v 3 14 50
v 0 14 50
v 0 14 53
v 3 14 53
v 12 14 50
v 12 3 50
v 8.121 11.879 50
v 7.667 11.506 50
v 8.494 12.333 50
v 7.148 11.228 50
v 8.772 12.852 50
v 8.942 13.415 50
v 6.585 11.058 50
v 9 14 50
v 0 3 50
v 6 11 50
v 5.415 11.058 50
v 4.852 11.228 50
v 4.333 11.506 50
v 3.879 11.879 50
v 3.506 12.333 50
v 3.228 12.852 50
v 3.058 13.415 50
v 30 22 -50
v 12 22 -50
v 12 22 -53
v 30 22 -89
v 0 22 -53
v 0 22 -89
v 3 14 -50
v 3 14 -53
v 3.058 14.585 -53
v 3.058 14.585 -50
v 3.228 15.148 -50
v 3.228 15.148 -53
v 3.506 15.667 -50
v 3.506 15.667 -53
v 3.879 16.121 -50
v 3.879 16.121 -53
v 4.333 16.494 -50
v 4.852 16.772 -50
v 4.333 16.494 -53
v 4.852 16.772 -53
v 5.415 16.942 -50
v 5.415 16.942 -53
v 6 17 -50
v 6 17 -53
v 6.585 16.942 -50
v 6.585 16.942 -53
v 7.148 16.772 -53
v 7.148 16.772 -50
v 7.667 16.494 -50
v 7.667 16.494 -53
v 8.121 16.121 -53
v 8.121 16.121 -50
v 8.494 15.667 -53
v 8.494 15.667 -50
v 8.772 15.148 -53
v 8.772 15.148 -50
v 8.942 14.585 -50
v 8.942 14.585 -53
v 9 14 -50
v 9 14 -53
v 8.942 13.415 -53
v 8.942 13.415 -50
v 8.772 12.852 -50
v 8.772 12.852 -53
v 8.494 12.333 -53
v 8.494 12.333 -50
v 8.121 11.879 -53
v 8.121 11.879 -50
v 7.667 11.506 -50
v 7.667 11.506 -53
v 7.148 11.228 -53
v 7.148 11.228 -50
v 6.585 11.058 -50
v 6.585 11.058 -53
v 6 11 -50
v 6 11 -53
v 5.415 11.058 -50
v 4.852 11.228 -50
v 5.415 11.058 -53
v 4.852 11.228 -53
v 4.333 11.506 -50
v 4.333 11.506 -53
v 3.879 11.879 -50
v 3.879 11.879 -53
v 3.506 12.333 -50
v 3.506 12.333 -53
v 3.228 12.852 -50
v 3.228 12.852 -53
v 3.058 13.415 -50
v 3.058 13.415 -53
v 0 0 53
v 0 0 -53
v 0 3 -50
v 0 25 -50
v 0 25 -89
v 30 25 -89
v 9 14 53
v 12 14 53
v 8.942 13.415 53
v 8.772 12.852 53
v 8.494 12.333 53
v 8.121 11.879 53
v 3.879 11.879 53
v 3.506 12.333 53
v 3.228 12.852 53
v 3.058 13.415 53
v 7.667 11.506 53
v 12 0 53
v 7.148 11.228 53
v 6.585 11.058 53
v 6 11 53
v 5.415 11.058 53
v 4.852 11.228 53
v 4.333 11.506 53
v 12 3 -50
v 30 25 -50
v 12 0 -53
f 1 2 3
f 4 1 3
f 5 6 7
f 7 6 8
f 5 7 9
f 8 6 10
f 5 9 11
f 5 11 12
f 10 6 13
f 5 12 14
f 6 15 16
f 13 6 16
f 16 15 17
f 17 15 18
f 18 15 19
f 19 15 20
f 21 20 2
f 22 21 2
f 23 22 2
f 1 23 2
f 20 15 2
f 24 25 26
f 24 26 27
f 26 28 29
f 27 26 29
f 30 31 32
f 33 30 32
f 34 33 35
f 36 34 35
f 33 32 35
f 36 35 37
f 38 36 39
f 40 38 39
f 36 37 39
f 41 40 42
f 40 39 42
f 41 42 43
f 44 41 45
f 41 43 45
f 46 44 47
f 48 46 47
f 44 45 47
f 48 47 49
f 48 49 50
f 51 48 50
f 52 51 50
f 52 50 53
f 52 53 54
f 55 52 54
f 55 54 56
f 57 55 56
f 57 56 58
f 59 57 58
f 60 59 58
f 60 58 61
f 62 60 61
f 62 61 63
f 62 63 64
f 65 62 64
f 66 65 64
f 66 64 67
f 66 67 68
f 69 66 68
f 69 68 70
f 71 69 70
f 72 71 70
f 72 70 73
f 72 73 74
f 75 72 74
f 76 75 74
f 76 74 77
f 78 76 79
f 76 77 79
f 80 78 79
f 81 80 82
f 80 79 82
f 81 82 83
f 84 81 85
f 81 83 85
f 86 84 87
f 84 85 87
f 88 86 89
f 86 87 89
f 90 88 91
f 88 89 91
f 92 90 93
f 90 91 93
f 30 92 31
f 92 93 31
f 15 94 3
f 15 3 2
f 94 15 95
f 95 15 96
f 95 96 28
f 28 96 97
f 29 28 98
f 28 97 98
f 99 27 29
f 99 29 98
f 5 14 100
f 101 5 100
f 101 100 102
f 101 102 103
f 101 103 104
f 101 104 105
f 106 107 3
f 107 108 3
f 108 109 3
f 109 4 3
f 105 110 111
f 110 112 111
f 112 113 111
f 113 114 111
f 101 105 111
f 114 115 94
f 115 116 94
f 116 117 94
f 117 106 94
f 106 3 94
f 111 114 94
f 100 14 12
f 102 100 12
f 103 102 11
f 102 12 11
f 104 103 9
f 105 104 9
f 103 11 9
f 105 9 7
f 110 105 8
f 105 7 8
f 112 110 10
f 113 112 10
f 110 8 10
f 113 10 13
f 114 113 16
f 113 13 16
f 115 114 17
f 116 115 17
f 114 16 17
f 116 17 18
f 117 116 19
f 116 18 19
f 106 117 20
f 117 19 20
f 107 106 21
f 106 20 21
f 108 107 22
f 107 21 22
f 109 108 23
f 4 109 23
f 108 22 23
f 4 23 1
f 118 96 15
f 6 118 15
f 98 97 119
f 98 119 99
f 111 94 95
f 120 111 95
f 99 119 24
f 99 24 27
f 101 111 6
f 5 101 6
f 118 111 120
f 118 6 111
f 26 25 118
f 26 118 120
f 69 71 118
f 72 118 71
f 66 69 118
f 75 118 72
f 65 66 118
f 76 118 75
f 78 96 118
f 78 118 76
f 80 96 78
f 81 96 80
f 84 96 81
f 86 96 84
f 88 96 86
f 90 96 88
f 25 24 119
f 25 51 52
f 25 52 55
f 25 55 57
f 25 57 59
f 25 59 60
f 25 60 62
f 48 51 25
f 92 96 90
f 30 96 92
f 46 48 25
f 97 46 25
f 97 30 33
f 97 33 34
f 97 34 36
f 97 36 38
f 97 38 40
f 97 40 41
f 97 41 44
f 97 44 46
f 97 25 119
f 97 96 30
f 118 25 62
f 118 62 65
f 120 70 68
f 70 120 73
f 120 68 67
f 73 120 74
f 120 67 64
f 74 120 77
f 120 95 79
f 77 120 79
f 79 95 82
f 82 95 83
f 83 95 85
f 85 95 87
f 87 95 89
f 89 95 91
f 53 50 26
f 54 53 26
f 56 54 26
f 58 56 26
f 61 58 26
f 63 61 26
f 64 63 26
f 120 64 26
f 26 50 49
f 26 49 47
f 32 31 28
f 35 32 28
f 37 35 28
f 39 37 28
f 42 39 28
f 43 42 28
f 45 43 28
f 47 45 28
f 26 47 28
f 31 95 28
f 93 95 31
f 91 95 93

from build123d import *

# Parameters (mm, degrees)
EXTRUDE_1_DEPTH     = 12
CUT_EXTRUDE_1_REACH = 111.567
SKETCH_3_R          = 3
SKETCH_5_W          = 39
SKETCH_5_H          = 3
EXTRUDE_2_DEPTH     = 18


with BuildPart() as part:
    # 草图2 → 凸台-拉伸1 (new body)
    with BuildSketch(Plane(origin=(0, 0, 0), x_dir=(0, 0, -1), z_dir=(1, 0, 0))):
        Polygon((-53, 0), (53, 0), (53, 20), (53, 22), (89, 22), (89, 25), (50, 25), (50, 20), (50, 3), (-50, 3), (-50, 14), (-53, 14), align=None)
    extrude(amount=EXTRUDE_1_DEPTH)

    # 切除-拉伸1: up to this face of the body (flat: up to its plane)
    cut_extrude_1_end = Plane(part.part.faces().sort_by_distance((6, 7, 53))[0])
    # 草图3 → 切除-拉伸1 (cut, up to the picked face)
    with BuildSketch(Plane(origin=(0, 0, -53), x_dir=(-1, 0, 0), z_dir=(0, 0, -1)), mode=Mode.PRIVATE) as cut_extrude_1_sk1:
        with Locations((-6, 14)):
            Circle(SKETCH_3_R)
    cut_extrude_1_tool1 = split(extrude(cut_extrude_1_sk1.sketch, amount=-CUT_EXTRUDE_1_REACH, mode=Mode.PRIVATE), bisect_by=cut_extrude_1_end, keep=Keep.BOTH, mode=Mode.PRIVATE)
    add(cut_extrude_1_tool1.solids().sort_by(Axis((6, 14, -53), (0, 0, 1)))[0], mode=Mode.SUBTRACT)

    # 草图5 → 凸台-拉伸2 (add)
    with BuildSketch(Plane(origin=(12, 0, 0), x_dir=(0, 0, -1), z_dir=(1, 0, 0))):
        with Locations((69.5, 23.5)):
            Rectangle(SKETCH_5_W, SKETCH_5_H)
    extrude(amount=EXTRUDE_2_DEPTH)


solid = part.part
